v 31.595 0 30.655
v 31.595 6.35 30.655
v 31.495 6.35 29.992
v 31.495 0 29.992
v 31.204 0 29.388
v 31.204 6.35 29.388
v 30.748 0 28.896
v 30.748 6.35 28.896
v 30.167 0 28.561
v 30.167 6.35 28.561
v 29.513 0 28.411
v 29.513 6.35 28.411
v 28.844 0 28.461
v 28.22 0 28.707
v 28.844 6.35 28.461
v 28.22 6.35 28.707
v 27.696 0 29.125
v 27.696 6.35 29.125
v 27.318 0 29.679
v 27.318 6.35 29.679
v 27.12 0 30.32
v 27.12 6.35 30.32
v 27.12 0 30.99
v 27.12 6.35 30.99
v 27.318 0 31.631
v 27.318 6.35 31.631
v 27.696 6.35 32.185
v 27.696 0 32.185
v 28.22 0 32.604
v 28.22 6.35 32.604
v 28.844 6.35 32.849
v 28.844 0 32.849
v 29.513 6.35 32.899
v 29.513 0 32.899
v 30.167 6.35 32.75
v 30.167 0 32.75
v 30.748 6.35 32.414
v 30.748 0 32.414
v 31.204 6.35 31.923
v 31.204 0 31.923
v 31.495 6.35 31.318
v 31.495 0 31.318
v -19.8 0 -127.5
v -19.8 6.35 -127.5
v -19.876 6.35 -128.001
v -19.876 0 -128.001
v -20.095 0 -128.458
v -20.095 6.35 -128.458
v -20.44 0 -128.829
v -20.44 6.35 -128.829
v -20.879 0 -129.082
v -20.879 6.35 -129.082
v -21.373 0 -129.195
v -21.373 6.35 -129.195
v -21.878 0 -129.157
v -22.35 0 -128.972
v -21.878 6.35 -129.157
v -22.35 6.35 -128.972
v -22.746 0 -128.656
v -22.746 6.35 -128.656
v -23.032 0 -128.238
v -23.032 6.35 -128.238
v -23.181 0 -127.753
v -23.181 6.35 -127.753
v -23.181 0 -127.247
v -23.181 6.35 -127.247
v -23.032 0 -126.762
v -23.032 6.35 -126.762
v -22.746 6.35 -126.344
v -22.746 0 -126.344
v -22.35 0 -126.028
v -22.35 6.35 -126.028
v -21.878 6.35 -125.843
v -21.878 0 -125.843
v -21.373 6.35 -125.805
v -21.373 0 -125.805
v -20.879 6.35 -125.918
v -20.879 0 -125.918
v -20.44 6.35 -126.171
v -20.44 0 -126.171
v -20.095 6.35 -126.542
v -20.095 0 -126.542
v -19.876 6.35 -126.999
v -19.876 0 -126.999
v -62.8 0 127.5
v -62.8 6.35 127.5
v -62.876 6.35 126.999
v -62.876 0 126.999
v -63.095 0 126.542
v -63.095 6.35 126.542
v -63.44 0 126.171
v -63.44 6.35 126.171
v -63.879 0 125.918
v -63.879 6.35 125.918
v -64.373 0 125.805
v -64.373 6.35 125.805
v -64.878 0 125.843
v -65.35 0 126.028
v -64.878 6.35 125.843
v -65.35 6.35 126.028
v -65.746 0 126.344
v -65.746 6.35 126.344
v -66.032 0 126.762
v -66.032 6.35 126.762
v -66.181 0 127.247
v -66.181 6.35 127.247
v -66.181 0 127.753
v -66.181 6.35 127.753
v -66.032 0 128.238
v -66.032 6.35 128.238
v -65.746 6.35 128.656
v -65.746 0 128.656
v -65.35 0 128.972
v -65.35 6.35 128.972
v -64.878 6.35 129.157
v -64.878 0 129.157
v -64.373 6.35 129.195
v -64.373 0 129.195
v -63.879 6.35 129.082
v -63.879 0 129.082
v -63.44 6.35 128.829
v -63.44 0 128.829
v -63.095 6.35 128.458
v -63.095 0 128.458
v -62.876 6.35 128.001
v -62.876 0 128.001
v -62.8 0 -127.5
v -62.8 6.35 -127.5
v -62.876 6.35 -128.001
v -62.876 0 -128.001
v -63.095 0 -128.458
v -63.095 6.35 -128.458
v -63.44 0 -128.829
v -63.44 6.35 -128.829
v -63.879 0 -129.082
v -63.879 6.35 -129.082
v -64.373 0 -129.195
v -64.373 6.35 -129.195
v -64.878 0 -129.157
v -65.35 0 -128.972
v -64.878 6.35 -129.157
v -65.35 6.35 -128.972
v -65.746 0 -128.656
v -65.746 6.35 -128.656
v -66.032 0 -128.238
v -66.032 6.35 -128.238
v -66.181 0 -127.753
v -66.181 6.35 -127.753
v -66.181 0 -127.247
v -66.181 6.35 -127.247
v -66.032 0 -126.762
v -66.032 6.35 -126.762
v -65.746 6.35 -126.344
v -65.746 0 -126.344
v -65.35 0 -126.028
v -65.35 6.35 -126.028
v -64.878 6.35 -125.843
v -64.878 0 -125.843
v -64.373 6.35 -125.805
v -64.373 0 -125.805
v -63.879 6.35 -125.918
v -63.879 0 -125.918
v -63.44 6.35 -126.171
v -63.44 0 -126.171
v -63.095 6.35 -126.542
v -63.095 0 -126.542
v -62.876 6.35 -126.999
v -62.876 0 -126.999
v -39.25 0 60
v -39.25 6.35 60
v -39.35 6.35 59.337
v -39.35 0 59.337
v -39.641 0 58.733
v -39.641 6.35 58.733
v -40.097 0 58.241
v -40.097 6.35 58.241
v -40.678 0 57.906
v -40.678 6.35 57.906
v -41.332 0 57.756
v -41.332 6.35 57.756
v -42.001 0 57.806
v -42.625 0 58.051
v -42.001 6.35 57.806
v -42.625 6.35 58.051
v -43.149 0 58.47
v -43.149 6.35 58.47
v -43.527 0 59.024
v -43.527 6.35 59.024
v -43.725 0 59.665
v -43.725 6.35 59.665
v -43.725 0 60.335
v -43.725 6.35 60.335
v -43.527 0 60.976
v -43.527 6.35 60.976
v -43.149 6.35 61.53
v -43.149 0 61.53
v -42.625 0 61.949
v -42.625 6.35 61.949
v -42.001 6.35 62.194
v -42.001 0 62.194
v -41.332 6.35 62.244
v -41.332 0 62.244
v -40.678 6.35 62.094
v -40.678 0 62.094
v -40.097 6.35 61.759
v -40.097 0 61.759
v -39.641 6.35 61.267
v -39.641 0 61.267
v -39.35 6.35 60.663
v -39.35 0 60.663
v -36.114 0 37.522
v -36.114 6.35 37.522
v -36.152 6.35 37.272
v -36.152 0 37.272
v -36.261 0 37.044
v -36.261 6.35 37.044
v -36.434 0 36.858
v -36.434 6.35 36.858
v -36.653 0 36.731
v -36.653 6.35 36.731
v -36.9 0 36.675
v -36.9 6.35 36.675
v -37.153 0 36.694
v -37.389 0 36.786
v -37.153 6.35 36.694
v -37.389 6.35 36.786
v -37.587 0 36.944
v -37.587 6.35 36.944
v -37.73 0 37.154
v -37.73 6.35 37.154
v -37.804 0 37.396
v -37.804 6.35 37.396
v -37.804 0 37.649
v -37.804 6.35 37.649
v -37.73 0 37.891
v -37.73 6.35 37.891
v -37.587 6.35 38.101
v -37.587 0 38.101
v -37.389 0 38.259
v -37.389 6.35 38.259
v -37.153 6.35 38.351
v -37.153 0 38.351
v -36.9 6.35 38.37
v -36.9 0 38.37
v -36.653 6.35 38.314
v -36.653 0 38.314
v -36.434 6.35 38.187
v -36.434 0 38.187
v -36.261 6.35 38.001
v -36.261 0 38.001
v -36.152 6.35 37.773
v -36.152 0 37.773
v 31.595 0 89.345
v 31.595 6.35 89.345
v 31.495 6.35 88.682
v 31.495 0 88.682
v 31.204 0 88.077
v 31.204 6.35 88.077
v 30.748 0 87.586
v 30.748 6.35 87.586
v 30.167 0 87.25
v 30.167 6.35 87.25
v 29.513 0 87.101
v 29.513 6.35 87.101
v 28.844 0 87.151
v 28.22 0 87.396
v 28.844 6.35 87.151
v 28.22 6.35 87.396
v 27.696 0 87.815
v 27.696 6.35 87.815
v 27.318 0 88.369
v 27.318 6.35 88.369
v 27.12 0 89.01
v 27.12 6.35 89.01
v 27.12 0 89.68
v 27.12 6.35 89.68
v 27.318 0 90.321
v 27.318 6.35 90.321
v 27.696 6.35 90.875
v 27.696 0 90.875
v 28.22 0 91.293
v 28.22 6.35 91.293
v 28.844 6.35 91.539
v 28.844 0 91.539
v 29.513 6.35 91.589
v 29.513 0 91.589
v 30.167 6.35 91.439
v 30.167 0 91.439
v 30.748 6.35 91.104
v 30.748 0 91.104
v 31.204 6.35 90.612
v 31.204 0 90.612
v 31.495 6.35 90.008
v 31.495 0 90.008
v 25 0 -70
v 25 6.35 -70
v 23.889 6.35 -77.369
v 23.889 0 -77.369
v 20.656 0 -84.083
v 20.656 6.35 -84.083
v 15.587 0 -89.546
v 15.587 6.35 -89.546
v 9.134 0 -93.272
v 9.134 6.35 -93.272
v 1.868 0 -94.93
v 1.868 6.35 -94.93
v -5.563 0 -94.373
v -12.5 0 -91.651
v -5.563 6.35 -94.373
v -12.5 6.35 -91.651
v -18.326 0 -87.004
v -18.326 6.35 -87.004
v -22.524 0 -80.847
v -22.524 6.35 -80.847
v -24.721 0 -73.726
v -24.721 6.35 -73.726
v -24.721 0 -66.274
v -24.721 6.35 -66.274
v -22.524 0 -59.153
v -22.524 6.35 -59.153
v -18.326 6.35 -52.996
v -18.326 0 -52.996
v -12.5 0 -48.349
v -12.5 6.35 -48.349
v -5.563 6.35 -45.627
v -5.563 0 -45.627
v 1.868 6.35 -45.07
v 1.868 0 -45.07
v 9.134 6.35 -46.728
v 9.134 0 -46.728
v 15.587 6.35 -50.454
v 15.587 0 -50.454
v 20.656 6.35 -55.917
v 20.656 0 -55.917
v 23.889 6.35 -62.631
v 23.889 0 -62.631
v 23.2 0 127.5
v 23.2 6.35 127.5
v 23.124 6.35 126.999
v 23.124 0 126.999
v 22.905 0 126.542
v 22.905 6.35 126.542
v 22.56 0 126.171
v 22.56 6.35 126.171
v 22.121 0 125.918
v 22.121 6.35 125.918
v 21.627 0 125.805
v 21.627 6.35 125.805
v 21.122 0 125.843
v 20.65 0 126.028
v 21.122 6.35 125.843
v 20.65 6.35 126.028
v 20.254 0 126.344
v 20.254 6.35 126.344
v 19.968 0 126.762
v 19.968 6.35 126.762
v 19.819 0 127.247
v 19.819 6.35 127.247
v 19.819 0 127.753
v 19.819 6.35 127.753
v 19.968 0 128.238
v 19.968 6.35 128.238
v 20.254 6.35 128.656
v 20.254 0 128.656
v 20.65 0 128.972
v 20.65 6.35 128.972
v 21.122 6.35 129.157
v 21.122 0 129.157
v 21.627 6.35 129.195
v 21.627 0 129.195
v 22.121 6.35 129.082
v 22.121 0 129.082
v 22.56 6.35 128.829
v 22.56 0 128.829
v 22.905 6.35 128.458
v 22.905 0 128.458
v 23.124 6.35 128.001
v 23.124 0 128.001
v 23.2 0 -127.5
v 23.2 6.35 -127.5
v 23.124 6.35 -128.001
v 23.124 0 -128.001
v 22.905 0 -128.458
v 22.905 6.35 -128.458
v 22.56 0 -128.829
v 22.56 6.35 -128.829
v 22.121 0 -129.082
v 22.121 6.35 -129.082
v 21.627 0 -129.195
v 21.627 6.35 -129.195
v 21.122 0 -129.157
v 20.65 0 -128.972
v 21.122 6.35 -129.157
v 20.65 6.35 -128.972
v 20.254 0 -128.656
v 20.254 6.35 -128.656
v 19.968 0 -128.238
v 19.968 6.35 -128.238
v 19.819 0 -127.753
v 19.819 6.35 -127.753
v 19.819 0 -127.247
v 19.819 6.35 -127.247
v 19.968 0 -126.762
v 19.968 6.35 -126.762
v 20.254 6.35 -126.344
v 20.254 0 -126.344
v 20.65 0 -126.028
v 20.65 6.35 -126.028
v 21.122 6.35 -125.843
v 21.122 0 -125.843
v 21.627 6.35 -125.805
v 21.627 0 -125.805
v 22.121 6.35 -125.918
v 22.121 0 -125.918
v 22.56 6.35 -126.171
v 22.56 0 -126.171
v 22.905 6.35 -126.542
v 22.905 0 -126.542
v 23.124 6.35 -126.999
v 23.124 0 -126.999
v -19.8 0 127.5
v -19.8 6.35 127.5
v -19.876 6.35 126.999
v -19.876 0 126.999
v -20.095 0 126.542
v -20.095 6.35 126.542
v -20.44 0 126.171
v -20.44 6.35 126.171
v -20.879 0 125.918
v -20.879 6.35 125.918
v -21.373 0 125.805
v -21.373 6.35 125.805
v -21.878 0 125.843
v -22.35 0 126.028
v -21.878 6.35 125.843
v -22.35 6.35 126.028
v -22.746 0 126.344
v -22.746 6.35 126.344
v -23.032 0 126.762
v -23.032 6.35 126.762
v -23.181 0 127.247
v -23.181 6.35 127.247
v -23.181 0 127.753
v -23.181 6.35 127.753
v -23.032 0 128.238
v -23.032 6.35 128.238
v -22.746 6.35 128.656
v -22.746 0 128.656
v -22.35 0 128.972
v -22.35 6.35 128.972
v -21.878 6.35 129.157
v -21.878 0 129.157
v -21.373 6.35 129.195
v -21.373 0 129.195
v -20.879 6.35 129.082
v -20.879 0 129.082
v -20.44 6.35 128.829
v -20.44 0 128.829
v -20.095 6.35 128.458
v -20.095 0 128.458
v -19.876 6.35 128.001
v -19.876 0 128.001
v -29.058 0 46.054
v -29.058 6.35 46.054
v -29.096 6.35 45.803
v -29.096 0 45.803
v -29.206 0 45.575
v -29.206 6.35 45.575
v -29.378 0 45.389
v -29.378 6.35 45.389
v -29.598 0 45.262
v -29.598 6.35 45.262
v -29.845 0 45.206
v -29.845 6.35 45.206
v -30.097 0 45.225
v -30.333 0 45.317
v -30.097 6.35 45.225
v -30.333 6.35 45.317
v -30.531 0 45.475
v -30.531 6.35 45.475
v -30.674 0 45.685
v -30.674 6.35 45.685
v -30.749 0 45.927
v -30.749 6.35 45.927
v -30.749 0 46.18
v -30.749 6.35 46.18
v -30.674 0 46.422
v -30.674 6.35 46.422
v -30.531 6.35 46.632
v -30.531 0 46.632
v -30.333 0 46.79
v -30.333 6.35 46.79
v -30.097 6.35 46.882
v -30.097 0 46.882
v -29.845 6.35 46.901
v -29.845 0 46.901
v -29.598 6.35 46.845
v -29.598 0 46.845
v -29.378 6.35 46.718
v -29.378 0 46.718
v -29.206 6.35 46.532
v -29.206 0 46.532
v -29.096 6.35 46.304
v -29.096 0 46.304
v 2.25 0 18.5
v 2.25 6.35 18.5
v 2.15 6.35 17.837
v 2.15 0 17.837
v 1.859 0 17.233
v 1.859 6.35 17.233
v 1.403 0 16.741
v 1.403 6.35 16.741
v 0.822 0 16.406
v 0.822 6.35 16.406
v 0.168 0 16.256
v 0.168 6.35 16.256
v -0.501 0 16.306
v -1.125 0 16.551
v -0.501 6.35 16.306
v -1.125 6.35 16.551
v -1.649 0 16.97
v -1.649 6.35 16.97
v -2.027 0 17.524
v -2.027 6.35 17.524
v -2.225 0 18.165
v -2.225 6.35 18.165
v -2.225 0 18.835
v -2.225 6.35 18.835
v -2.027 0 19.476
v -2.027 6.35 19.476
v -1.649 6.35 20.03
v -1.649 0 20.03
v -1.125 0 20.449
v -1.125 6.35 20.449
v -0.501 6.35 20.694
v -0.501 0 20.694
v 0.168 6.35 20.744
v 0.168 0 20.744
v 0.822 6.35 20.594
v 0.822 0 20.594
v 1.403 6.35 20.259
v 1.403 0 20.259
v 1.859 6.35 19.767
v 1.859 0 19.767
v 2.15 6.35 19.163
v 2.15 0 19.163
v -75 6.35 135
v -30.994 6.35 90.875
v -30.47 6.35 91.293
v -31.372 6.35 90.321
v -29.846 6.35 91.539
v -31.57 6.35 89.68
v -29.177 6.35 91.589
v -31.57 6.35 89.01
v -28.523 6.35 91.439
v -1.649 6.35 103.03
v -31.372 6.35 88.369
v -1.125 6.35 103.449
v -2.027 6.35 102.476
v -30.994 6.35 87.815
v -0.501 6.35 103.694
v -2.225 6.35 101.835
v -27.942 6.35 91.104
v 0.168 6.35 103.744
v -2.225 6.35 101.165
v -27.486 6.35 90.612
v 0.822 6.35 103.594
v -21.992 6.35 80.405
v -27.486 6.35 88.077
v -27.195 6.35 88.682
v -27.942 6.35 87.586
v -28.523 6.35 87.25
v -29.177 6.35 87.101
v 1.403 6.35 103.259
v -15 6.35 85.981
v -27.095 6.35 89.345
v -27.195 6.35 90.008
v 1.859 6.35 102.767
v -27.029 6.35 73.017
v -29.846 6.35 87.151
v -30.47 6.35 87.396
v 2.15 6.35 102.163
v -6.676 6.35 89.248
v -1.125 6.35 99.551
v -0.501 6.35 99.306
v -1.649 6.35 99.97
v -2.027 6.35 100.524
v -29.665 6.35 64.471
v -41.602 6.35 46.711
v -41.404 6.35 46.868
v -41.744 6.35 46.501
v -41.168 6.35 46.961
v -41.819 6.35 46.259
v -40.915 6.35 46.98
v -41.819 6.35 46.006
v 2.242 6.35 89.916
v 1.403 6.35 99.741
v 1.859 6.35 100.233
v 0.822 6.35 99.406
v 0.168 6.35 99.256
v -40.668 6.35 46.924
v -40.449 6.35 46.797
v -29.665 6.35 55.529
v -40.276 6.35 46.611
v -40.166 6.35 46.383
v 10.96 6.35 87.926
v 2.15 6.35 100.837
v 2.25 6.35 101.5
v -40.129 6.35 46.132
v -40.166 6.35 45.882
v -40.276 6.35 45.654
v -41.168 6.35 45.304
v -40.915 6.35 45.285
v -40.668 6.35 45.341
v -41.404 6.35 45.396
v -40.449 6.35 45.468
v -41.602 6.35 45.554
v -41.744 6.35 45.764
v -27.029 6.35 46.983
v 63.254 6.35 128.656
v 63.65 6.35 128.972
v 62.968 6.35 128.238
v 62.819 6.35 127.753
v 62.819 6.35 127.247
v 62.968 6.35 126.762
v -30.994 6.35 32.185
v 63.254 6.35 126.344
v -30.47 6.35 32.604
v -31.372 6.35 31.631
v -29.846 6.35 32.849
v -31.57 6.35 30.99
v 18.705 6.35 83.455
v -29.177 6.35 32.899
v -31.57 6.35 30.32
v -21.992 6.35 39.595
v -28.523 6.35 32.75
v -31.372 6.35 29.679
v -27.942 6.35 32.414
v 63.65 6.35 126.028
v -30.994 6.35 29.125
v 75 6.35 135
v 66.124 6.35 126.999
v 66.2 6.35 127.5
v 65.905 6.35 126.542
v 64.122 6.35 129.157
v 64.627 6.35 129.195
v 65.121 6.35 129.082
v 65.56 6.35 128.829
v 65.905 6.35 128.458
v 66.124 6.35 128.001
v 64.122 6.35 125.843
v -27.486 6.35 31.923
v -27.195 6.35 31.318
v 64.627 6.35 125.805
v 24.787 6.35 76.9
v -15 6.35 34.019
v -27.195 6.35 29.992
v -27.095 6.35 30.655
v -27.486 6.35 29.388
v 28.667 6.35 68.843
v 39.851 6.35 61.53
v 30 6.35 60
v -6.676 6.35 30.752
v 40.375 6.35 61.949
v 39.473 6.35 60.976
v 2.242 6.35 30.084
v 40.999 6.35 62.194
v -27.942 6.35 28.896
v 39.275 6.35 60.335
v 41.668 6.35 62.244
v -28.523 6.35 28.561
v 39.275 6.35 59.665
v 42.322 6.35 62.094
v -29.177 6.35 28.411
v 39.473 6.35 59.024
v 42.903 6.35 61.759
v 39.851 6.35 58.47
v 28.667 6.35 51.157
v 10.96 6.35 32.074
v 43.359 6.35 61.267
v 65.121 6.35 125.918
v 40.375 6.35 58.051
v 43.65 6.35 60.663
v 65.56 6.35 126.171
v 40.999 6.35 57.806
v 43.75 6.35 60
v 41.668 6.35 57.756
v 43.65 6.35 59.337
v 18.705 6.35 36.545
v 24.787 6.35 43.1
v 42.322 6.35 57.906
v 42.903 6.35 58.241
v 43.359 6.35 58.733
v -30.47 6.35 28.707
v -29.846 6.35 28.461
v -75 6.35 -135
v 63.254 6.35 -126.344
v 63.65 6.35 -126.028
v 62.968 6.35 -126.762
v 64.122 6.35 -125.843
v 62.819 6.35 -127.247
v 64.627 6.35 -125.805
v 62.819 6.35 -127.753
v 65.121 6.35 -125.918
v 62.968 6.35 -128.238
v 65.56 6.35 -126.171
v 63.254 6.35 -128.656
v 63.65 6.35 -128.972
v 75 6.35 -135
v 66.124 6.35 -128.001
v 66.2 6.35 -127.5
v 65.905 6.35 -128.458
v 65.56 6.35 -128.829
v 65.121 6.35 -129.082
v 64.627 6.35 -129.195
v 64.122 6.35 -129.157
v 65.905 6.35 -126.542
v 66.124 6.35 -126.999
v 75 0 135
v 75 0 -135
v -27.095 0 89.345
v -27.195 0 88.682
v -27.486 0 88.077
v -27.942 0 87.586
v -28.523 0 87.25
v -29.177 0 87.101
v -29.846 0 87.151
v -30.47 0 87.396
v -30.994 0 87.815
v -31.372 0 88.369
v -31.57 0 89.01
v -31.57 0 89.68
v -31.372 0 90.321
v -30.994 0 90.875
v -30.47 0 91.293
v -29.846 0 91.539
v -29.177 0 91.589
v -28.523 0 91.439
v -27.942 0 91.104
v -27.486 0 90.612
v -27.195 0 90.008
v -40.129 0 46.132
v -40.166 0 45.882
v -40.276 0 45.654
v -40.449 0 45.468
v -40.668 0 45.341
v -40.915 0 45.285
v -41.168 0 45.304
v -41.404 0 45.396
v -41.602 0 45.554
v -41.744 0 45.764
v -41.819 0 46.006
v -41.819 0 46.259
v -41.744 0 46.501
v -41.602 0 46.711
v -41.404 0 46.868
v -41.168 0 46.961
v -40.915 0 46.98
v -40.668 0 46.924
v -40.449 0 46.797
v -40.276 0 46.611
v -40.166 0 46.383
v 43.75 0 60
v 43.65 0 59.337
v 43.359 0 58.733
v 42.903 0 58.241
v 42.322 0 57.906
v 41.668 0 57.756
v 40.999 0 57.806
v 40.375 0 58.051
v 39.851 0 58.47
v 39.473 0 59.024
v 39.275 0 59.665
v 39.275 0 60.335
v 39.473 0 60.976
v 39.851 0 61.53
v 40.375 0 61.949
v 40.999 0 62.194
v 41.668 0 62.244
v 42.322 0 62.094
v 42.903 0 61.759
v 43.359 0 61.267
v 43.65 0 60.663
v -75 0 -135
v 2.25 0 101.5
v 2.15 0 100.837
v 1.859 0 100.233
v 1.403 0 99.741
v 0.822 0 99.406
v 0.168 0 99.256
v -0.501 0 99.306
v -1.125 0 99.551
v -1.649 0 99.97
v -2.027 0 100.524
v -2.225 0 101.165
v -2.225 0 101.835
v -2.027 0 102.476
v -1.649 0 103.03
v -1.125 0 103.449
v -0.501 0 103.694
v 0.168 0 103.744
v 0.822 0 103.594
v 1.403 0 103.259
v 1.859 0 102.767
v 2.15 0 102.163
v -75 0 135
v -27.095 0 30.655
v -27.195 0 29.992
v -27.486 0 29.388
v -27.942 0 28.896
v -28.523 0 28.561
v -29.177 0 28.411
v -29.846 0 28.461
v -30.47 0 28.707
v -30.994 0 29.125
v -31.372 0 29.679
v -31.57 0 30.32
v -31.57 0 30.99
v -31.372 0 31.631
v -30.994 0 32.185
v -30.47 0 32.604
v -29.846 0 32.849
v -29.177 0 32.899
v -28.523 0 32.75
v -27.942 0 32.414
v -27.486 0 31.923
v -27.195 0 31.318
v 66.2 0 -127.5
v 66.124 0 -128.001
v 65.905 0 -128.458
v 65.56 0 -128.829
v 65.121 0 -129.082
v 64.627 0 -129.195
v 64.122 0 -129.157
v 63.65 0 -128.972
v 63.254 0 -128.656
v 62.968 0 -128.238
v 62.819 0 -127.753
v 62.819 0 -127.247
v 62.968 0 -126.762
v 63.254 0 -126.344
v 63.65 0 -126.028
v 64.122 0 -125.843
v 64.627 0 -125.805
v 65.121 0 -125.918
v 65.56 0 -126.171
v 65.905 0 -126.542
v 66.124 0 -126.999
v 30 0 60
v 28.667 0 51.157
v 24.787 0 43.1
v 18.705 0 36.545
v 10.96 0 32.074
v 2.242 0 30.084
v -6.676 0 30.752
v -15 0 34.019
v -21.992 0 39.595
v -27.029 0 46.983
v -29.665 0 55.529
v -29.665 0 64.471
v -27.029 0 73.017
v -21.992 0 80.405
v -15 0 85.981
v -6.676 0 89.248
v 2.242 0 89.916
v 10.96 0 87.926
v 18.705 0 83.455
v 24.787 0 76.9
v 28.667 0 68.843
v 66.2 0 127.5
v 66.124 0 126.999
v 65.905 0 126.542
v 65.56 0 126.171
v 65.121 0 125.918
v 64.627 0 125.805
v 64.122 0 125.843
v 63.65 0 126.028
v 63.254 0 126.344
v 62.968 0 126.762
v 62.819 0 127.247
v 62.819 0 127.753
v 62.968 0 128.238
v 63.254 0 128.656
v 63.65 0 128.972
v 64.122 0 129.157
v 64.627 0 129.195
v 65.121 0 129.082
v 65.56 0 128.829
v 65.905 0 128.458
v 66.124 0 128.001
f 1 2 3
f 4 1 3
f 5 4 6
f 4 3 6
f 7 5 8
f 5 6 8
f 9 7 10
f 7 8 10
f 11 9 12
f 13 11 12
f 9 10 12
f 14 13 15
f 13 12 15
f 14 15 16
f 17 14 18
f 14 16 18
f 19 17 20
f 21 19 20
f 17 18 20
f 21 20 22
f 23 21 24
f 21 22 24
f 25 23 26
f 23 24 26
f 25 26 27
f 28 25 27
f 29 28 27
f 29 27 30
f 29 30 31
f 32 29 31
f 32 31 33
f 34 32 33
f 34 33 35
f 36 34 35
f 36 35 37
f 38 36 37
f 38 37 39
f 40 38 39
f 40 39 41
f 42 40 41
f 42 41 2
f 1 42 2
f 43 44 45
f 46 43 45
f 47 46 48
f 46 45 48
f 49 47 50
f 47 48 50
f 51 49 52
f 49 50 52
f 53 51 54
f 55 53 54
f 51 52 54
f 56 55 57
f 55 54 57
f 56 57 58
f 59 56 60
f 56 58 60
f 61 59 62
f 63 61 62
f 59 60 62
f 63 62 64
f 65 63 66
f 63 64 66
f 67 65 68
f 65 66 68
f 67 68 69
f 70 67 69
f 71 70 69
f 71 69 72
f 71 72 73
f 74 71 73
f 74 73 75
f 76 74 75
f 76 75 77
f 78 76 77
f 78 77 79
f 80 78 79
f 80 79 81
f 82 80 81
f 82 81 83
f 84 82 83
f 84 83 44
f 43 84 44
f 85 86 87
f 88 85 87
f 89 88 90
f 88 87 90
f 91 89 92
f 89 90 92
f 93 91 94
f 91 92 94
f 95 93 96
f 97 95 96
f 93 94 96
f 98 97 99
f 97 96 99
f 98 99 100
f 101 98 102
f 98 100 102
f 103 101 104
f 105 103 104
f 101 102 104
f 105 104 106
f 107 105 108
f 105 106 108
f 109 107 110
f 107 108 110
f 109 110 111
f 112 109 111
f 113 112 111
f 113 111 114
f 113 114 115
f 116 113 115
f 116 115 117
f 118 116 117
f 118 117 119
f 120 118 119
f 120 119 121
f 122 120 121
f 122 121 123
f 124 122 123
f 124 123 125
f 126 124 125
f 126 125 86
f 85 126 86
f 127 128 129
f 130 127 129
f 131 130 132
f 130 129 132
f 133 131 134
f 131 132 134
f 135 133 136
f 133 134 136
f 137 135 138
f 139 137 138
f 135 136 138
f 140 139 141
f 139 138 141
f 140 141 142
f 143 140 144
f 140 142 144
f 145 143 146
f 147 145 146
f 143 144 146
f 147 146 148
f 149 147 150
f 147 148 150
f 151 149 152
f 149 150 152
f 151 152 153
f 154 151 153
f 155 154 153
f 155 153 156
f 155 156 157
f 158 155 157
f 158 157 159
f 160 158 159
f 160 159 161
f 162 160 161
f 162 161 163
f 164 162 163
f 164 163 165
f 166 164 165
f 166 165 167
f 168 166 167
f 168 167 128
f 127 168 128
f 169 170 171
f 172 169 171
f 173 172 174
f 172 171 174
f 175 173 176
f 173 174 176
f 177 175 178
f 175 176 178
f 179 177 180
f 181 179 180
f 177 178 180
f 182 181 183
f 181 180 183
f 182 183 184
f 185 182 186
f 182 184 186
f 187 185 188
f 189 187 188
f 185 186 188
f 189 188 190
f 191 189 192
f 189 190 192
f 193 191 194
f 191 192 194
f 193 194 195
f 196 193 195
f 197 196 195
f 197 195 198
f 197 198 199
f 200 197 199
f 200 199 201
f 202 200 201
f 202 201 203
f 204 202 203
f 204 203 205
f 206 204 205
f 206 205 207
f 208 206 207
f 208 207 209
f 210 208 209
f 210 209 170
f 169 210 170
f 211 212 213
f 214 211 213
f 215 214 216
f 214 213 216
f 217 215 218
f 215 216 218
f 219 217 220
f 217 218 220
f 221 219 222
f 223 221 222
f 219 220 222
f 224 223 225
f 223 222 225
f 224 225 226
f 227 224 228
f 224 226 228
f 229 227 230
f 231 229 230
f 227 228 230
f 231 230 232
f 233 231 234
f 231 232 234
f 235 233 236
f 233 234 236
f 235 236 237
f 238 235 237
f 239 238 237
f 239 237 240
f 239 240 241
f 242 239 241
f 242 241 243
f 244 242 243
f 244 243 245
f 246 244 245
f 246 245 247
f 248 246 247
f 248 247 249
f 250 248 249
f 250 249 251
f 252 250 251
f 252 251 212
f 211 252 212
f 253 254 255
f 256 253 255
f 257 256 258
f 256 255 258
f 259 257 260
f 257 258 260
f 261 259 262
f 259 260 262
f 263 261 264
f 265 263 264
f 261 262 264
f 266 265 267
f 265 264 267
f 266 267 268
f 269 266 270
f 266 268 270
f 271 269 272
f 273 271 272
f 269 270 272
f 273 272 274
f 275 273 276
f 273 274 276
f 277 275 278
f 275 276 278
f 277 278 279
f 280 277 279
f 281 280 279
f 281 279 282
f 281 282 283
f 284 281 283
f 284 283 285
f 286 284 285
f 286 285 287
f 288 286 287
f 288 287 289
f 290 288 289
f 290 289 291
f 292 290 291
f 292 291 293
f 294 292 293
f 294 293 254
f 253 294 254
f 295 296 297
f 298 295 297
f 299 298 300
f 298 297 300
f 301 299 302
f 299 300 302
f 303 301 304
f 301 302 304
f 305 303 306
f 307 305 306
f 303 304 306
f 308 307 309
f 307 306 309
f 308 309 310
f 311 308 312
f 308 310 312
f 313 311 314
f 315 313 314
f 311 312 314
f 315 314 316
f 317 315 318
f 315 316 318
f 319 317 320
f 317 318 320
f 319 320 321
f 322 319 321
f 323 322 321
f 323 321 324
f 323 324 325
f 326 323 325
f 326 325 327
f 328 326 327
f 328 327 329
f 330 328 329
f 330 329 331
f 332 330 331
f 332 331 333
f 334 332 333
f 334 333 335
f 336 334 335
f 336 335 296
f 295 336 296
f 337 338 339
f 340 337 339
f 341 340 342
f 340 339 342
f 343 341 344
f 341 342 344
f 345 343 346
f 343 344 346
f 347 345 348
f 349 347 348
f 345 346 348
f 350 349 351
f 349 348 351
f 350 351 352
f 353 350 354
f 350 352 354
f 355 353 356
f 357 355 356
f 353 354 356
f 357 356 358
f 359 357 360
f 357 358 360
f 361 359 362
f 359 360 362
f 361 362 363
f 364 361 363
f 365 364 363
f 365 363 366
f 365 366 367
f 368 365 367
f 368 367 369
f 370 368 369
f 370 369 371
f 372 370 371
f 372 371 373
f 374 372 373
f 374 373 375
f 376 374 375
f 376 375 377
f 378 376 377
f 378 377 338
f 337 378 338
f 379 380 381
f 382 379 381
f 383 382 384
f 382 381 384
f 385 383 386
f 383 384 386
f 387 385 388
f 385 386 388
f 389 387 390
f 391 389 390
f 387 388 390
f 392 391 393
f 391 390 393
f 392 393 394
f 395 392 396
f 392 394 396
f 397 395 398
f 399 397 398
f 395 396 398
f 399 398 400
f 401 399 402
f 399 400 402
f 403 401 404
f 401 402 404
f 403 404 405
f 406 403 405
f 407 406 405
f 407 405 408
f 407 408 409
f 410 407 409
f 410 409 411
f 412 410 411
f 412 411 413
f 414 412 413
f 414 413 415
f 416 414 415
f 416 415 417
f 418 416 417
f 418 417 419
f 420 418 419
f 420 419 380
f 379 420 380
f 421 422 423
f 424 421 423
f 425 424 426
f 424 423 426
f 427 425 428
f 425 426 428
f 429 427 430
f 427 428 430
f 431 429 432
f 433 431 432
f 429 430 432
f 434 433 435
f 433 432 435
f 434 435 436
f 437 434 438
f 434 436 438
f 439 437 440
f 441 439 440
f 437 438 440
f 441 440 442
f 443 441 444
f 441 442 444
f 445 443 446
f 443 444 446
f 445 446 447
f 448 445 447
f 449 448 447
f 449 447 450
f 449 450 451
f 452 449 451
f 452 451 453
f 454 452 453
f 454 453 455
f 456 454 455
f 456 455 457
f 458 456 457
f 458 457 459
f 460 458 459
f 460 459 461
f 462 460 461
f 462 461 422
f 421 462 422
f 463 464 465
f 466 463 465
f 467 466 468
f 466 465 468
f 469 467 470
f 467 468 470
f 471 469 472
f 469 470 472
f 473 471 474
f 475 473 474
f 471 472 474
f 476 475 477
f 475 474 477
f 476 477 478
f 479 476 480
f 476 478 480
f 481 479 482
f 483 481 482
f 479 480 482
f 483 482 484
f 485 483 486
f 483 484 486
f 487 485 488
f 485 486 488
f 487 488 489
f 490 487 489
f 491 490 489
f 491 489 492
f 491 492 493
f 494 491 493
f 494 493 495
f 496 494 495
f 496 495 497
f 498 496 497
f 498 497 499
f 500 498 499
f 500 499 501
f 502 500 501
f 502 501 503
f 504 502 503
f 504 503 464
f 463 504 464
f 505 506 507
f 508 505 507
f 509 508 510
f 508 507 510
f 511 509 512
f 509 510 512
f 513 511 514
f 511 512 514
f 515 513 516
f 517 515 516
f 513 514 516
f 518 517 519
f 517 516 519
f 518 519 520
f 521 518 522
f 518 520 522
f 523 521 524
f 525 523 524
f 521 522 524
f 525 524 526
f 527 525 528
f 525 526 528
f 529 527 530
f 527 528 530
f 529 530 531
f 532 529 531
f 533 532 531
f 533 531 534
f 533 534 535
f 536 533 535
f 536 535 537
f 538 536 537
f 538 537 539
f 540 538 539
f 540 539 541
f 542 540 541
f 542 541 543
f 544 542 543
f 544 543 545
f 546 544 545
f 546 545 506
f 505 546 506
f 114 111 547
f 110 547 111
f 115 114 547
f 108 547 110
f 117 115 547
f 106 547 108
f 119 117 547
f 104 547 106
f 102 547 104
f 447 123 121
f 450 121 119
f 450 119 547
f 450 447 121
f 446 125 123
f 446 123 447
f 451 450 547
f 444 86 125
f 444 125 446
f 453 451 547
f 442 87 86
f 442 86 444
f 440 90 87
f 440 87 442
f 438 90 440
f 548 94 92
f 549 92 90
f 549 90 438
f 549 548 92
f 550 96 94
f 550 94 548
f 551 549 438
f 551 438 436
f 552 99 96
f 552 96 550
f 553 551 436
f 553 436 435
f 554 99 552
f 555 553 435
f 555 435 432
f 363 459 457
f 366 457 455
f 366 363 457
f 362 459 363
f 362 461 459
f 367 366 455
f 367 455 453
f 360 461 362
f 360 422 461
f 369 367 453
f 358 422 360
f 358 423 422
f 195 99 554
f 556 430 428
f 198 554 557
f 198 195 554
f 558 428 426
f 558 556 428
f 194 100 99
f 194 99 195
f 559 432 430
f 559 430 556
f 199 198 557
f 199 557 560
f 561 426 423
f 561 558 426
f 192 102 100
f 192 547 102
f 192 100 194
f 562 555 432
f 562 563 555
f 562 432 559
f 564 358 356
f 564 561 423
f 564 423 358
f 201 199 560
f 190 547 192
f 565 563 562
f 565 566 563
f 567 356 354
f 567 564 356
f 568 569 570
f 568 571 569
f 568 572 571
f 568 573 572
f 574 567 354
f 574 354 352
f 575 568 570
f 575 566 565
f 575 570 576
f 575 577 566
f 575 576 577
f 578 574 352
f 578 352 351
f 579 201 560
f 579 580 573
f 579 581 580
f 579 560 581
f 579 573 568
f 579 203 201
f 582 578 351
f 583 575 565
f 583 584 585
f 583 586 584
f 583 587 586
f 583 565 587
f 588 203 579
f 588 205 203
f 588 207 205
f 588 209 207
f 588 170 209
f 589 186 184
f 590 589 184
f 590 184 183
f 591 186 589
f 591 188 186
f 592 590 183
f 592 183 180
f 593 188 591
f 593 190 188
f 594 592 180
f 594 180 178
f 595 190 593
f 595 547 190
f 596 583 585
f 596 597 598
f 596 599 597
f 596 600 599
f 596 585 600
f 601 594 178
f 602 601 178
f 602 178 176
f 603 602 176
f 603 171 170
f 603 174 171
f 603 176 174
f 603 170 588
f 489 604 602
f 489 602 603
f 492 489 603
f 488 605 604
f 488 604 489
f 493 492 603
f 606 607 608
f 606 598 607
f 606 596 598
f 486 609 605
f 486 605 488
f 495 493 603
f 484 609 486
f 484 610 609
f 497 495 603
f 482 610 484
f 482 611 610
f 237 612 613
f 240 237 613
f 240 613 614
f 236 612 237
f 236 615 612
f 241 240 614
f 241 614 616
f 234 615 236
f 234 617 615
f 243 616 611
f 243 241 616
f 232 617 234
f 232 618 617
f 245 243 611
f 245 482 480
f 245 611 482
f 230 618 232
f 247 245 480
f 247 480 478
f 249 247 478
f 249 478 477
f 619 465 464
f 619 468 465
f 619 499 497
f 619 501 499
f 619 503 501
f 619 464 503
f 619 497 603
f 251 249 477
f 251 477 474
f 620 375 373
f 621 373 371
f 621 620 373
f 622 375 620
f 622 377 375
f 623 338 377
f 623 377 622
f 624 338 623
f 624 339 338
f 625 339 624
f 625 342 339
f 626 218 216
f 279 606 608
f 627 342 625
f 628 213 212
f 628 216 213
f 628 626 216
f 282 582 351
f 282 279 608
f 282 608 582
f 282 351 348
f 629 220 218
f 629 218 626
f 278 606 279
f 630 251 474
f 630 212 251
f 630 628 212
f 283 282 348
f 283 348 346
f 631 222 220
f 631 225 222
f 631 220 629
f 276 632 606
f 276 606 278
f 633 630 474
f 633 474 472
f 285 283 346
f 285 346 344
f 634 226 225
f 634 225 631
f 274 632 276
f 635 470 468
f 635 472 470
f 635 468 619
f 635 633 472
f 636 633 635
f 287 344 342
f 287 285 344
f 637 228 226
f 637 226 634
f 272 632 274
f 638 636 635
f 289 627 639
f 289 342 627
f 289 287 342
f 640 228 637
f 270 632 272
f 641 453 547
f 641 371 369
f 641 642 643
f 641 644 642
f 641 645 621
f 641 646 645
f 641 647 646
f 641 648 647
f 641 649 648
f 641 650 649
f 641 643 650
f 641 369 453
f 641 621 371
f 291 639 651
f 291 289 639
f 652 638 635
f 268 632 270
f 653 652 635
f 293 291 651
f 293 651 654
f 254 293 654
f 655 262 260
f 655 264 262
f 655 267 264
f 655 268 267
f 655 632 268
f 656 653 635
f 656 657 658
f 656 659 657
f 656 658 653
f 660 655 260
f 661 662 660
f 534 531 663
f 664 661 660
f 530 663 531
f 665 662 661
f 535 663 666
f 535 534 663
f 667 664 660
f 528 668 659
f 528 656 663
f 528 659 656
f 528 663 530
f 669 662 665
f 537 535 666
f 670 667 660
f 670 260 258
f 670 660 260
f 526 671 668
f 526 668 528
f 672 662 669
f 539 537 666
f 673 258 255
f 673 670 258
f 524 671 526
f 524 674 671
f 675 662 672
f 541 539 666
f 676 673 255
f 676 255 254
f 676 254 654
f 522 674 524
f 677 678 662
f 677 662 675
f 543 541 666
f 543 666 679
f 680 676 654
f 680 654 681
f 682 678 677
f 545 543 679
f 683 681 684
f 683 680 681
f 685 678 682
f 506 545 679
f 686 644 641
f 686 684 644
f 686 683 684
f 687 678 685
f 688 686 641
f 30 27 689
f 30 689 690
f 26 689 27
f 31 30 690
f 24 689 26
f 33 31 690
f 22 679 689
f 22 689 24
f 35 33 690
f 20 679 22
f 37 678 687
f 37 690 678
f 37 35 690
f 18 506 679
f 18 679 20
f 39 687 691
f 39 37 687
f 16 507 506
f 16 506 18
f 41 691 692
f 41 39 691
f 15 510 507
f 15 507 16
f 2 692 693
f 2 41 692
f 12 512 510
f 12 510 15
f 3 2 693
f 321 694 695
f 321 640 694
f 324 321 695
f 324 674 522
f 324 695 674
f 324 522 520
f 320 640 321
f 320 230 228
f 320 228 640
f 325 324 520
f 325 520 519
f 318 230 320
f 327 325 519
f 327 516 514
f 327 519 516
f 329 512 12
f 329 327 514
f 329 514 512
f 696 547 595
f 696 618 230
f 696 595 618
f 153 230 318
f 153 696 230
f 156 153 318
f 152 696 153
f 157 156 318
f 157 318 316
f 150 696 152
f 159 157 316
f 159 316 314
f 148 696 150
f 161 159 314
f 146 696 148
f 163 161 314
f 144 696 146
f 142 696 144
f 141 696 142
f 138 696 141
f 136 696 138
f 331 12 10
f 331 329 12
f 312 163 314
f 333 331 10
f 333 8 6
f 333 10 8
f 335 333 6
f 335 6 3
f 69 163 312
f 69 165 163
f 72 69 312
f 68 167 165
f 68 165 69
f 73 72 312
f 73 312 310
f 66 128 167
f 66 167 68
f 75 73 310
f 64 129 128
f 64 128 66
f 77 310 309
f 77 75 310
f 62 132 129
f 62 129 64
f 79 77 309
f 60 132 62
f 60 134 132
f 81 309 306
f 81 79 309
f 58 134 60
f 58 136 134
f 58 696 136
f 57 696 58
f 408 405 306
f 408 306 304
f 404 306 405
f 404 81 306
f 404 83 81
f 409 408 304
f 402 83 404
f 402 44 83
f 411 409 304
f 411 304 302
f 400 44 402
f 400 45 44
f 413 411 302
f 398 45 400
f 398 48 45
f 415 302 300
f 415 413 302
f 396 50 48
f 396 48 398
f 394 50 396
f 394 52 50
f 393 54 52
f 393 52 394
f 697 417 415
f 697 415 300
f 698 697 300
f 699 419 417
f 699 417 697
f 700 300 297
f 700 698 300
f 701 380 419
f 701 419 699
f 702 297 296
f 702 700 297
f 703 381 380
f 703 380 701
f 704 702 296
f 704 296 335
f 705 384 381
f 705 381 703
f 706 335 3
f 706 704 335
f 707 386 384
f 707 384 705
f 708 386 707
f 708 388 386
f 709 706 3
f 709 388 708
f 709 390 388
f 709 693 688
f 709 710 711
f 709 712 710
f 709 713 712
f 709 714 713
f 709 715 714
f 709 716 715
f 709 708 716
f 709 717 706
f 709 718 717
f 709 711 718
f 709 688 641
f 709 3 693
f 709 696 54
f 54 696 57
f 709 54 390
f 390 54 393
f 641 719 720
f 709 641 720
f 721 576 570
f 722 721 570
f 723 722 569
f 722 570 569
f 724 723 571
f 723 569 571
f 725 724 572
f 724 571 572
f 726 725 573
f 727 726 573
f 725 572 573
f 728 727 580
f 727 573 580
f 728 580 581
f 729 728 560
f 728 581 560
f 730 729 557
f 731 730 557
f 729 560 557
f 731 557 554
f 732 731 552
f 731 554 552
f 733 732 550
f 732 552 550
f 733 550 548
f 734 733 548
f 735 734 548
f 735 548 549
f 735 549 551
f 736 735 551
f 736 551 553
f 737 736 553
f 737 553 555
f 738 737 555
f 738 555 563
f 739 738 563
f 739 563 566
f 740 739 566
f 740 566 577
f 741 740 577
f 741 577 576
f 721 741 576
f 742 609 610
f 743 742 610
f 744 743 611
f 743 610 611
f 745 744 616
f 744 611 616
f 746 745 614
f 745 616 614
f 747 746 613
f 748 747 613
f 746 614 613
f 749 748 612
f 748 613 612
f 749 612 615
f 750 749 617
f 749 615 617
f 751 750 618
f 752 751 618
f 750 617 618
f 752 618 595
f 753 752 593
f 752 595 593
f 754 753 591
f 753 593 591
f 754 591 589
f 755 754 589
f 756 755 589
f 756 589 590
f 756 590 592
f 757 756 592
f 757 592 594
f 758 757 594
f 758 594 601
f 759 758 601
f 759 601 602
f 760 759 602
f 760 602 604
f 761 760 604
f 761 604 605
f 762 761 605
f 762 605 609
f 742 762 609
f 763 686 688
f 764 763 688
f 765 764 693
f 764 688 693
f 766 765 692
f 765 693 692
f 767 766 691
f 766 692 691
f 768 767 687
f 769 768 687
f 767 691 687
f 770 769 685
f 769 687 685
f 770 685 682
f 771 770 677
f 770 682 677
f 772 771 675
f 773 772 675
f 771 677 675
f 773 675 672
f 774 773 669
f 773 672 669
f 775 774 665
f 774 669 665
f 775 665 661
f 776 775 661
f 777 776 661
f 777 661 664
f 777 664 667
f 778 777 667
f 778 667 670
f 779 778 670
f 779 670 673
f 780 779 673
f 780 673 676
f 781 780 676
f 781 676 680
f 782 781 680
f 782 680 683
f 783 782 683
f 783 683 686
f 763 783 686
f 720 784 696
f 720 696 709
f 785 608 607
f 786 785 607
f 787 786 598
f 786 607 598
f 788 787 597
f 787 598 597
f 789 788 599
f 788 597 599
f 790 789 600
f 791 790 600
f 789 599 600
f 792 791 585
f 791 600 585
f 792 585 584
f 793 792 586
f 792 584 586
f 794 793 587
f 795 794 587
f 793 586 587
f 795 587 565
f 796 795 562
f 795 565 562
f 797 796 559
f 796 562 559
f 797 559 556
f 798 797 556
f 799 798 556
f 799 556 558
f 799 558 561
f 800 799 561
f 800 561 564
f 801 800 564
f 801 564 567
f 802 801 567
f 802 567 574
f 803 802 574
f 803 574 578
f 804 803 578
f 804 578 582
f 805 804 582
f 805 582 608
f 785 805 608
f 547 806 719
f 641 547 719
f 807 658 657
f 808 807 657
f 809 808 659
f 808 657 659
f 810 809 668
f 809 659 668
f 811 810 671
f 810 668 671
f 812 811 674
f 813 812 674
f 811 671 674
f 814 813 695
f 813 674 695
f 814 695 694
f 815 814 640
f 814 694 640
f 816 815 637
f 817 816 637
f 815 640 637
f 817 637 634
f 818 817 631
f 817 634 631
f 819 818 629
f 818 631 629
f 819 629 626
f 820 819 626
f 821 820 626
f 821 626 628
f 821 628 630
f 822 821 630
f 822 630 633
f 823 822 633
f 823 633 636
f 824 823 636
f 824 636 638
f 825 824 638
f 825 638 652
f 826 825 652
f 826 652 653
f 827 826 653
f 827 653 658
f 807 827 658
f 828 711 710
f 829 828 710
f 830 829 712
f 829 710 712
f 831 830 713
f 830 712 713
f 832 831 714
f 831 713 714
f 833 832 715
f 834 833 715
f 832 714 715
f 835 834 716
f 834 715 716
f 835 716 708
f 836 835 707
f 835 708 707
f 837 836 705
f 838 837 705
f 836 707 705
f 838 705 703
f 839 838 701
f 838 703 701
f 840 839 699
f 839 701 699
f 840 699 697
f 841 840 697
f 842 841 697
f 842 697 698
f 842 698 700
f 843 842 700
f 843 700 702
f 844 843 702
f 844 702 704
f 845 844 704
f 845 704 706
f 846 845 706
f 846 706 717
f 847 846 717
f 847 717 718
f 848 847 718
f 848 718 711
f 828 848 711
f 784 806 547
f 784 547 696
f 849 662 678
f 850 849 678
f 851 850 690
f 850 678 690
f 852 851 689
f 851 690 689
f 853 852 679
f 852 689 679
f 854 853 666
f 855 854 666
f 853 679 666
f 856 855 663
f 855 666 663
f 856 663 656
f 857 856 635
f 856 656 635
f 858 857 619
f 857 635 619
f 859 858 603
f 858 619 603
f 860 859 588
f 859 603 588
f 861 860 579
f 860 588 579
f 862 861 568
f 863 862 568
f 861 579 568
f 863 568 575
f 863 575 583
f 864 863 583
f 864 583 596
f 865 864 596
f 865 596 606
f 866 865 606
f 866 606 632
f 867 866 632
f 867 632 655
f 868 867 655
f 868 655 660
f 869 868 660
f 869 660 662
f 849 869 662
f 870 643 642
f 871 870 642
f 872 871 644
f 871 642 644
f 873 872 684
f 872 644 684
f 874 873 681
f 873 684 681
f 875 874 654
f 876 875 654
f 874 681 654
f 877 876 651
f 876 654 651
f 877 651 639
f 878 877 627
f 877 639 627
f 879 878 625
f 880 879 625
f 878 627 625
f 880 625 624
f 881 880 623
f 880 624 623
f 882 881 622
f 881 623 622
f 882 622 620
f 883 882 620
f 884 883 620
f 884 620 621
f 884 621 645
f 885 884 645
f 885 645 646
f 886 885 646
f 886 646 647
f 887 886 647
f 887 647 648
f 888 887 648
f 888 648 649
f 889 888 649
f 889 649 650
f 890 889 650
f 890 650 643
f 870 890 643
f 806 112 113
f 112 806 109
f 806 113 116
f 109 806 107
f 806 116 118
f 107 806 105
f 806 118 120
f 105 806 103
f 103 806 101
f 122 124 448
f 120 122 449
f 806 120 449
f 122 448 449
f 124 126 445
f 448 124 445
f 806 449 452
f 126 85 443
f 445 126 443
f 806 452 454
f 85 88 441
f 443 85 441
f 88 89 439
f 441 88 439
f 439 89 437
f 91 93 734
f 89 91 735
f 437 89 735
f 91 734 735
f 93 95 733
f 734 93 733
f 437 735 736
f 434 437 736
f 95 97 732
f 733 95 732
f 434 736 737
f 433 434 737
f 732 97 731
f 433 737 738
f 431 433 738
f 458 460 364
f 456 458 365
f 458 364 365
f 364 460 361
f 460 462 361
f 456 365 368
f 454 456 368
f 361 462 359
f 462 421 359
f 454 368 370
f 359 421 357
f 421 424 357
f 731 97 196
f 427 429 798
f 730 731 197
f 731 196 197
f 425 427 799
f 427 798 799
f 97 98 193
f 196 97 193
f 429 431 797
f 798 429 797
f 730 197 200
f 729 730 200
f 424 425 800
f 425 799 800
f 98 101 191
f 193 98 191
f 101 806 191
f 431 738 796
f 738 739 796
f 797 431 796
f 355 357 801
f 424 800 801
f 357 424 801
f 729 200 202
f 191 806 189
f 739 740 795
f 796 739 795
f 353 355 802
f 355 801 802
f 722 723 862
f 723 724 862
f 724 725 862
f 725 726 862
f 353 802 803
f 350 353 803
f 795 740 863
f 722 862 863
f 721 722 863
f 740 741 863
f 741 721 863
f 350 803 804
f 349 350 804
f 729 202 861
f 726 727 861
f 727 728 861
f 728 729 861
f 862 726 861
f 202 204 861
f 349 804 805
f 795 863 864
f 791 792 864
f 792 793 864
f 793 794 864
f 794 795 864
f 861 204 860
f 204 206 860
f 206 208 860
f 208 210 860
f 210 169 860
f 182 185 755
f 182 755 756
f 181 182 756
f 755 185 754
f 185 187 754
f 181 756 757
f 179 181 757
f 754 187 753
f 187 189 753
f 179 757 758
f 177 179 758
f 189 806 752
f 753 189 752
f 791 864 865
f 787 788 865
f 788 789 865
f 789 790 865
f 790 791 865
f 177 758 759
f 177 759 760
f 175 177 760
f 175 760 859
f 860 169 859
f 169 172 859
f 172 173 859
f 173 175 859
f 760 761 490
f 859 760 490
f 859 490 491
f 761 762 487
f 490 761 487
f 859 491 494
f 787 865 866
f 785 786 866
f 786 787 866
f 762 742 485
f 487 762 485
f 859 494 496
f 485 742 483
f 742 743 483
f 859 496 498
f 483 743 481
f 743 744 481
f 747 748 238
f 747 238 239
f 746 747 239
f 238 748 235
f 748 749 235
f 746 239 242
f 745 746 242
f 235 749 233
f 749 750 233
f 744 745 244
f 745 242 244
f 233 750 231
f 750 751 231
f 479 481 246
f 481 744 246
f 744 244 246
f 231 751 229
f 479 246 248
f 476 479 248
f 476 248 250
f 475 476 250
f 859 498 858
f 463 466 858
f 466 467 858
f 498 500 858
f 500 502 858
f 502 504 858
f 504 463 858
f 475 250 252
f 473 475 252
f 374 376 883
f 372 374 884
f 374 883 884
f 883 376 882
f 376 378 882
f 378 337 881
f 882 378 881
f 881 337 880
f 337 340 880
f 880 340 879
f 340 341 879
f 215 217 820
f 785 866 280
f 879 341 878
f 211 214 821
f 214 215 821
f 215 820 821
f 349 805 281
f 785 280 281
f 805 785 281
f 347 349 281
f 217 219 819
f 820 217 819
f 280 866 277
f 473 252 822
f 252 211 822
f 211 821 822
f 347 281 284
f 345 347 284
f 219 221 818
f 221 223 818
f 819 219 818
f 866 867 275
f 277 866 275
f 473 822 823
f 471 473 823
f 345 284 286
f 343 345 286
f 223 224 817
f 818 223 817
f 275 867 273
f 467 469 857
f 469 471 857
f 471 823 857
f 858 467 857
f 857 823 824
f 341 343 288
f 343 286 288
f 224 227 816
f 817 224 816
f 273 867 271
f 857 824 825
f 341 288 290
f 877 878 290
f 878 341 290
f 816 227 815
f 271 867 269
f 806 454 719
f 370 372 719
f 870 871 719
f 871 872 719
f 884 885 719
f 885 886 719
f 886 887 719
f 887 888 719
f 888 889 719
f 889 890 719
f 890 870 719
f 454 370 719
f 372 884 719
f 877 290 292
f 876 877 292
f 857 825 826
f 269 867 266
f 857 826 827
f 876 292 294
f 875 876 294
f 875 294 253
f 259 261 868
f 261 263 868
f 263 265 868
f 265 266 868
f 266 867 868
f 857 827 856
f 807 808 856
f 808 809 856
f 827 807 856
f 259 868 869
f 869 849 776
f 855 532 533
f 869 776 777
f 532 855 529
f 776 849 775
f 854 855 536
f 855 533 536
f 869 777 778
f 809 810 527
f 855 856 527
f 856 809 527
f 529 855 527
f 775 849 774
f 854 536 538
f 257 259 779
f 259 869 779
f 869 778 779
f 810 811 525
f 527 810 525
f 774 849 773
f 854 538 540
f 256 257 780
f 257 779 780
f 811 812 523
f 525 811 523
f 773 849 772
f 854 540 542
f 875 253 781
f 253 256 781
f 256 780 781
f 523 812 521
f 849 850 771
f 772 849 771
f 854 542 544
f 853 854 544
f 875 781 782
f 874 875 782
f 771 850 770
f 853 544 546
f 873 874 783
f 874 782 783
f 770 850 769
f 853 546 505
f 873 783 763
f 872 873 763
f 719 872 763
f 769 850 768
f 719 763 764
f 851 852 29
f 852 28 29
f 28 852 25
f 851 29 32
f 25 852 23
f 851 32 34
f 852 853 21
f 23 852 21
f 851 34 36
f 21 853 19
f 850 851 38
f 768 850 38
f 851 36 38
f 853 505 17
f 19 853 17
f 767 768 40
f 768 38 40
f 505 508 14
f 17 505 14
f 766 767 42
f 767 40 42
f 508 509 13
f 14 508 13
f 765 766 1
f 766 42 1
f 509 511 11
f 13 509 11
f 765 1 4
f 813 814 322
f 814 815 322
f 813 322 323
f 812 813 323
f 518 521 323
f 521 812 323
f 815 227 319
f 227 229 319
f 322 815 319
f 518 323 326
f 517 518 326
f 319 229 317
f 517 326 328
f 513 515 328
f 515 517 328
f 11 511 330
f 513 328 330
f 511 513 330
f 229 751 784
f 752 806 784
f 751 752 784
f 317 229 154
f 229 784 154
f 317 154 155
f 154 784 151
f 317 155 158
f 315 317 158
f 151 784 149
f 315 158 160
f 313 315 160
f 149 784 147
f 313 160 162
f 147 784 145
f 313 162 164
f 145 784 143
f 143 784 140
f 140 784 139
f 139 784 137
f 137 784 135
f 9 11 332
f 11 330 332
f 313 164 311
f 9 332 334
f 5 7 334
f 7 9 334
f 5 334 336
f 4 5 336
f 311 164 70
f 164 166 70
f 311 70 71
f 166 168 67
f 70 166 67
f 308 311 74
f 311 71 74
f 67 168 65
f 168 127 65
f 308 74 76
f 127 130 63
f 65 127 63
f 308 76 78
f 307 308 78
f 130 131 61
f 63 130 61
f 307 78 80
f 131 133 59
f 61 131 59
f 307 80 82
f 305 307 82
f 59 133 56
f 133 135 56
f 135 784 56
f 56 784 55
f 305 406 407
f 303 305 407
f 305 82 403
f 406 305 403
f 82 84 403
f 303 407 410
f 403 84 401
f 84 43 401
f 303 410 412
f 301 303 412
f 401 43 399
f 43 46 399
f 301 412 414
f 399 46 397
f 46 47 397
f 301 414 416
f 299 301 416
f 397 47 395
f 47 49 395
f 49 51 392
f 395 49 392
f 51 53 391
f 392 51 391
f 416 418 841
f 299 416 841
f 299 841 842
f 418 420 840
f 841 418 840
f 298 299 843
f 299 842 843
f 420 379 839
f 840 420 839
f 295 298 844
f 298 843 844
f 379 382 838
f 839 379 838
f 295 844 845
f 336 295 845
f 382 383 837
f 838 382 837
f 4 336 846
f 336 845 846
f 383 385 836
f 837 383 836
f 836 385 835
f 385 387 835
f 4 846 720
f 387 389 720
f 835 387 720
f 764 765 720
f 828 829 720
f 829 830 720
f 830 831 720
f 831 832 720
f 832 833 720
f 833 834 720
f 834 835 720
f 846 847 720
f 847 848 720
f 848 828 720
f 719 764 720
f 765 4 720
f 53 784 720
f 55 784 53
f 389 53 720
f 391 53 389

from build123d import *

# Parameters (mm, degrees)
SKETCH1_W           = 150
SKETCH1_H           = 270
BOSS_EXTRUDE1_DEPTH = 6.35
SKETCH2_R           = 2.25
SKETCH2_R_2         = 30
CUT_EXTRUDE1_DEPTH  = 7.35
SKETCH6_R           = 0.85
CUT_EXTRUDE5_DEPTH  = 7.35
SKETCH7_R           = 1.7
CUT_EXTRUDE6_DEPTH  = 7.35
SKETCH8_R           = 25
CUT_EXTRUDE9_DEPTH  = 7.35


with BuildPart() as part:
    # Sketch1 → Boss-Extrude1 (new body)
    with BuildSketch(Plane(origin=(0, 0, 0), x_dir=(1, 0, 0), z_dir=(0, 1, 0))):
        Rectangle(SKETCH1_W, SKETCH1_H)
    extrude(amount=BOSS_EXTRUDE1_DEPTH)

    # Sketch2 → Cut-Extrude1 (cut, through all)
    with BuildSketch(Plane(origin=(0, 6.35, 0), x_dir=(1, 0, 0), z_dir=(0, 1, 0))):
        with Locations((0, -18.5)):
            Circle(SKETCH2_R)
        with Locations((29.344931419, -30.655068581)):
            Circle(SKETCH2_R)
        with Locations((41.5, -60)):
            Circle(SKETCH2_R)
        with Locations((29.344931419, -89.344931419)):
            Circle(SKETCH2_R)
        with Locations((0, -101.5)):
            Circle(SKETCH2_R)
        with Locations((-29.344931419, -89.344931419)):
            Circle(SKETCH2_R)
        with Locations((-41.5, -60)):
            Circle(SKETCH2_R)
        with Locations((-29.344931419, -30.655068581)):
            Circle(SKETCH2_R)
        with Locations((0, -60)):
            Circle(SKETCH2_R_2)
    extrude(amount=-CUT_EXTRUDE1_DEPTH, mode=Mode.SUBTRACT)

    # Sketch6 → Cut-Extrude5 (cut, through all)
    with BuildSketch(Plane(origin=(0, 6.35, 0), x_dir=(1, 0, 0), z_dir=(0, 1, 0))):
        with Locations((-36.963798099, -37.522452757)):
            Circle(SKETCH6_R)
        with Locations((-40.978671586, -46.132376734)):
            Circle(SKETCH6_R)
        with Locations((-29.908156972, -46.053597363)):
            Circle(SKETCH6_R)
    extrude(amount=-CUT_EXTRUDE5_DEPTH, mode=Mode.SUBTRACT)

    # Sketch7 → Cut-Extrude6 (cut, through all)
    with BuildSketch(Plane(origin=(0, 6.35, 0), x_dir=(1, 0, 0), z_dir=(0, 1, 0))):
        with Locations((-64.5, -127.5)):
            Circle(SKETCH7_R)
        with Locations((-21.5, -127.5)):
            Circle(SKETCH7_R)
        with Locations((21.5, -127.5)):
            Circle(SKETCH7_R)
        with Locations((64.5, -127.5)):
            Circle(SKETCH7_R)
        with Locations((64.5, 127.5)):
            Circle(SKETCH7_R)
        with Locations((21.5, 127.5)):
            Circle(SKETCH7_R)
        with Locations((-64.5, 127.5)):
            Circle(SKETCH7_R)
        with Locations((-21.5, 127.5)):
            Circle(SKETCH7_R)
    extrude(amount=-CUT_EXTRUDE6_DEPTH, mode=Mode.SUBTRACT)

    # Sketch8 → Cut-Extrude9 (cut, through all)
    with BuildSketch(Plane(origin=(0, 6.35, 0), x_dir=(1, 0, 0), z_dir=(0, 1, 0))):
        with Locations((0, 70)):
            Circle(SKETCH8_R)
    extrude(amount=-CUT_EXTRUDE9_DEPTH, mode=Mode.SUBTRACT)


solid = part.part
